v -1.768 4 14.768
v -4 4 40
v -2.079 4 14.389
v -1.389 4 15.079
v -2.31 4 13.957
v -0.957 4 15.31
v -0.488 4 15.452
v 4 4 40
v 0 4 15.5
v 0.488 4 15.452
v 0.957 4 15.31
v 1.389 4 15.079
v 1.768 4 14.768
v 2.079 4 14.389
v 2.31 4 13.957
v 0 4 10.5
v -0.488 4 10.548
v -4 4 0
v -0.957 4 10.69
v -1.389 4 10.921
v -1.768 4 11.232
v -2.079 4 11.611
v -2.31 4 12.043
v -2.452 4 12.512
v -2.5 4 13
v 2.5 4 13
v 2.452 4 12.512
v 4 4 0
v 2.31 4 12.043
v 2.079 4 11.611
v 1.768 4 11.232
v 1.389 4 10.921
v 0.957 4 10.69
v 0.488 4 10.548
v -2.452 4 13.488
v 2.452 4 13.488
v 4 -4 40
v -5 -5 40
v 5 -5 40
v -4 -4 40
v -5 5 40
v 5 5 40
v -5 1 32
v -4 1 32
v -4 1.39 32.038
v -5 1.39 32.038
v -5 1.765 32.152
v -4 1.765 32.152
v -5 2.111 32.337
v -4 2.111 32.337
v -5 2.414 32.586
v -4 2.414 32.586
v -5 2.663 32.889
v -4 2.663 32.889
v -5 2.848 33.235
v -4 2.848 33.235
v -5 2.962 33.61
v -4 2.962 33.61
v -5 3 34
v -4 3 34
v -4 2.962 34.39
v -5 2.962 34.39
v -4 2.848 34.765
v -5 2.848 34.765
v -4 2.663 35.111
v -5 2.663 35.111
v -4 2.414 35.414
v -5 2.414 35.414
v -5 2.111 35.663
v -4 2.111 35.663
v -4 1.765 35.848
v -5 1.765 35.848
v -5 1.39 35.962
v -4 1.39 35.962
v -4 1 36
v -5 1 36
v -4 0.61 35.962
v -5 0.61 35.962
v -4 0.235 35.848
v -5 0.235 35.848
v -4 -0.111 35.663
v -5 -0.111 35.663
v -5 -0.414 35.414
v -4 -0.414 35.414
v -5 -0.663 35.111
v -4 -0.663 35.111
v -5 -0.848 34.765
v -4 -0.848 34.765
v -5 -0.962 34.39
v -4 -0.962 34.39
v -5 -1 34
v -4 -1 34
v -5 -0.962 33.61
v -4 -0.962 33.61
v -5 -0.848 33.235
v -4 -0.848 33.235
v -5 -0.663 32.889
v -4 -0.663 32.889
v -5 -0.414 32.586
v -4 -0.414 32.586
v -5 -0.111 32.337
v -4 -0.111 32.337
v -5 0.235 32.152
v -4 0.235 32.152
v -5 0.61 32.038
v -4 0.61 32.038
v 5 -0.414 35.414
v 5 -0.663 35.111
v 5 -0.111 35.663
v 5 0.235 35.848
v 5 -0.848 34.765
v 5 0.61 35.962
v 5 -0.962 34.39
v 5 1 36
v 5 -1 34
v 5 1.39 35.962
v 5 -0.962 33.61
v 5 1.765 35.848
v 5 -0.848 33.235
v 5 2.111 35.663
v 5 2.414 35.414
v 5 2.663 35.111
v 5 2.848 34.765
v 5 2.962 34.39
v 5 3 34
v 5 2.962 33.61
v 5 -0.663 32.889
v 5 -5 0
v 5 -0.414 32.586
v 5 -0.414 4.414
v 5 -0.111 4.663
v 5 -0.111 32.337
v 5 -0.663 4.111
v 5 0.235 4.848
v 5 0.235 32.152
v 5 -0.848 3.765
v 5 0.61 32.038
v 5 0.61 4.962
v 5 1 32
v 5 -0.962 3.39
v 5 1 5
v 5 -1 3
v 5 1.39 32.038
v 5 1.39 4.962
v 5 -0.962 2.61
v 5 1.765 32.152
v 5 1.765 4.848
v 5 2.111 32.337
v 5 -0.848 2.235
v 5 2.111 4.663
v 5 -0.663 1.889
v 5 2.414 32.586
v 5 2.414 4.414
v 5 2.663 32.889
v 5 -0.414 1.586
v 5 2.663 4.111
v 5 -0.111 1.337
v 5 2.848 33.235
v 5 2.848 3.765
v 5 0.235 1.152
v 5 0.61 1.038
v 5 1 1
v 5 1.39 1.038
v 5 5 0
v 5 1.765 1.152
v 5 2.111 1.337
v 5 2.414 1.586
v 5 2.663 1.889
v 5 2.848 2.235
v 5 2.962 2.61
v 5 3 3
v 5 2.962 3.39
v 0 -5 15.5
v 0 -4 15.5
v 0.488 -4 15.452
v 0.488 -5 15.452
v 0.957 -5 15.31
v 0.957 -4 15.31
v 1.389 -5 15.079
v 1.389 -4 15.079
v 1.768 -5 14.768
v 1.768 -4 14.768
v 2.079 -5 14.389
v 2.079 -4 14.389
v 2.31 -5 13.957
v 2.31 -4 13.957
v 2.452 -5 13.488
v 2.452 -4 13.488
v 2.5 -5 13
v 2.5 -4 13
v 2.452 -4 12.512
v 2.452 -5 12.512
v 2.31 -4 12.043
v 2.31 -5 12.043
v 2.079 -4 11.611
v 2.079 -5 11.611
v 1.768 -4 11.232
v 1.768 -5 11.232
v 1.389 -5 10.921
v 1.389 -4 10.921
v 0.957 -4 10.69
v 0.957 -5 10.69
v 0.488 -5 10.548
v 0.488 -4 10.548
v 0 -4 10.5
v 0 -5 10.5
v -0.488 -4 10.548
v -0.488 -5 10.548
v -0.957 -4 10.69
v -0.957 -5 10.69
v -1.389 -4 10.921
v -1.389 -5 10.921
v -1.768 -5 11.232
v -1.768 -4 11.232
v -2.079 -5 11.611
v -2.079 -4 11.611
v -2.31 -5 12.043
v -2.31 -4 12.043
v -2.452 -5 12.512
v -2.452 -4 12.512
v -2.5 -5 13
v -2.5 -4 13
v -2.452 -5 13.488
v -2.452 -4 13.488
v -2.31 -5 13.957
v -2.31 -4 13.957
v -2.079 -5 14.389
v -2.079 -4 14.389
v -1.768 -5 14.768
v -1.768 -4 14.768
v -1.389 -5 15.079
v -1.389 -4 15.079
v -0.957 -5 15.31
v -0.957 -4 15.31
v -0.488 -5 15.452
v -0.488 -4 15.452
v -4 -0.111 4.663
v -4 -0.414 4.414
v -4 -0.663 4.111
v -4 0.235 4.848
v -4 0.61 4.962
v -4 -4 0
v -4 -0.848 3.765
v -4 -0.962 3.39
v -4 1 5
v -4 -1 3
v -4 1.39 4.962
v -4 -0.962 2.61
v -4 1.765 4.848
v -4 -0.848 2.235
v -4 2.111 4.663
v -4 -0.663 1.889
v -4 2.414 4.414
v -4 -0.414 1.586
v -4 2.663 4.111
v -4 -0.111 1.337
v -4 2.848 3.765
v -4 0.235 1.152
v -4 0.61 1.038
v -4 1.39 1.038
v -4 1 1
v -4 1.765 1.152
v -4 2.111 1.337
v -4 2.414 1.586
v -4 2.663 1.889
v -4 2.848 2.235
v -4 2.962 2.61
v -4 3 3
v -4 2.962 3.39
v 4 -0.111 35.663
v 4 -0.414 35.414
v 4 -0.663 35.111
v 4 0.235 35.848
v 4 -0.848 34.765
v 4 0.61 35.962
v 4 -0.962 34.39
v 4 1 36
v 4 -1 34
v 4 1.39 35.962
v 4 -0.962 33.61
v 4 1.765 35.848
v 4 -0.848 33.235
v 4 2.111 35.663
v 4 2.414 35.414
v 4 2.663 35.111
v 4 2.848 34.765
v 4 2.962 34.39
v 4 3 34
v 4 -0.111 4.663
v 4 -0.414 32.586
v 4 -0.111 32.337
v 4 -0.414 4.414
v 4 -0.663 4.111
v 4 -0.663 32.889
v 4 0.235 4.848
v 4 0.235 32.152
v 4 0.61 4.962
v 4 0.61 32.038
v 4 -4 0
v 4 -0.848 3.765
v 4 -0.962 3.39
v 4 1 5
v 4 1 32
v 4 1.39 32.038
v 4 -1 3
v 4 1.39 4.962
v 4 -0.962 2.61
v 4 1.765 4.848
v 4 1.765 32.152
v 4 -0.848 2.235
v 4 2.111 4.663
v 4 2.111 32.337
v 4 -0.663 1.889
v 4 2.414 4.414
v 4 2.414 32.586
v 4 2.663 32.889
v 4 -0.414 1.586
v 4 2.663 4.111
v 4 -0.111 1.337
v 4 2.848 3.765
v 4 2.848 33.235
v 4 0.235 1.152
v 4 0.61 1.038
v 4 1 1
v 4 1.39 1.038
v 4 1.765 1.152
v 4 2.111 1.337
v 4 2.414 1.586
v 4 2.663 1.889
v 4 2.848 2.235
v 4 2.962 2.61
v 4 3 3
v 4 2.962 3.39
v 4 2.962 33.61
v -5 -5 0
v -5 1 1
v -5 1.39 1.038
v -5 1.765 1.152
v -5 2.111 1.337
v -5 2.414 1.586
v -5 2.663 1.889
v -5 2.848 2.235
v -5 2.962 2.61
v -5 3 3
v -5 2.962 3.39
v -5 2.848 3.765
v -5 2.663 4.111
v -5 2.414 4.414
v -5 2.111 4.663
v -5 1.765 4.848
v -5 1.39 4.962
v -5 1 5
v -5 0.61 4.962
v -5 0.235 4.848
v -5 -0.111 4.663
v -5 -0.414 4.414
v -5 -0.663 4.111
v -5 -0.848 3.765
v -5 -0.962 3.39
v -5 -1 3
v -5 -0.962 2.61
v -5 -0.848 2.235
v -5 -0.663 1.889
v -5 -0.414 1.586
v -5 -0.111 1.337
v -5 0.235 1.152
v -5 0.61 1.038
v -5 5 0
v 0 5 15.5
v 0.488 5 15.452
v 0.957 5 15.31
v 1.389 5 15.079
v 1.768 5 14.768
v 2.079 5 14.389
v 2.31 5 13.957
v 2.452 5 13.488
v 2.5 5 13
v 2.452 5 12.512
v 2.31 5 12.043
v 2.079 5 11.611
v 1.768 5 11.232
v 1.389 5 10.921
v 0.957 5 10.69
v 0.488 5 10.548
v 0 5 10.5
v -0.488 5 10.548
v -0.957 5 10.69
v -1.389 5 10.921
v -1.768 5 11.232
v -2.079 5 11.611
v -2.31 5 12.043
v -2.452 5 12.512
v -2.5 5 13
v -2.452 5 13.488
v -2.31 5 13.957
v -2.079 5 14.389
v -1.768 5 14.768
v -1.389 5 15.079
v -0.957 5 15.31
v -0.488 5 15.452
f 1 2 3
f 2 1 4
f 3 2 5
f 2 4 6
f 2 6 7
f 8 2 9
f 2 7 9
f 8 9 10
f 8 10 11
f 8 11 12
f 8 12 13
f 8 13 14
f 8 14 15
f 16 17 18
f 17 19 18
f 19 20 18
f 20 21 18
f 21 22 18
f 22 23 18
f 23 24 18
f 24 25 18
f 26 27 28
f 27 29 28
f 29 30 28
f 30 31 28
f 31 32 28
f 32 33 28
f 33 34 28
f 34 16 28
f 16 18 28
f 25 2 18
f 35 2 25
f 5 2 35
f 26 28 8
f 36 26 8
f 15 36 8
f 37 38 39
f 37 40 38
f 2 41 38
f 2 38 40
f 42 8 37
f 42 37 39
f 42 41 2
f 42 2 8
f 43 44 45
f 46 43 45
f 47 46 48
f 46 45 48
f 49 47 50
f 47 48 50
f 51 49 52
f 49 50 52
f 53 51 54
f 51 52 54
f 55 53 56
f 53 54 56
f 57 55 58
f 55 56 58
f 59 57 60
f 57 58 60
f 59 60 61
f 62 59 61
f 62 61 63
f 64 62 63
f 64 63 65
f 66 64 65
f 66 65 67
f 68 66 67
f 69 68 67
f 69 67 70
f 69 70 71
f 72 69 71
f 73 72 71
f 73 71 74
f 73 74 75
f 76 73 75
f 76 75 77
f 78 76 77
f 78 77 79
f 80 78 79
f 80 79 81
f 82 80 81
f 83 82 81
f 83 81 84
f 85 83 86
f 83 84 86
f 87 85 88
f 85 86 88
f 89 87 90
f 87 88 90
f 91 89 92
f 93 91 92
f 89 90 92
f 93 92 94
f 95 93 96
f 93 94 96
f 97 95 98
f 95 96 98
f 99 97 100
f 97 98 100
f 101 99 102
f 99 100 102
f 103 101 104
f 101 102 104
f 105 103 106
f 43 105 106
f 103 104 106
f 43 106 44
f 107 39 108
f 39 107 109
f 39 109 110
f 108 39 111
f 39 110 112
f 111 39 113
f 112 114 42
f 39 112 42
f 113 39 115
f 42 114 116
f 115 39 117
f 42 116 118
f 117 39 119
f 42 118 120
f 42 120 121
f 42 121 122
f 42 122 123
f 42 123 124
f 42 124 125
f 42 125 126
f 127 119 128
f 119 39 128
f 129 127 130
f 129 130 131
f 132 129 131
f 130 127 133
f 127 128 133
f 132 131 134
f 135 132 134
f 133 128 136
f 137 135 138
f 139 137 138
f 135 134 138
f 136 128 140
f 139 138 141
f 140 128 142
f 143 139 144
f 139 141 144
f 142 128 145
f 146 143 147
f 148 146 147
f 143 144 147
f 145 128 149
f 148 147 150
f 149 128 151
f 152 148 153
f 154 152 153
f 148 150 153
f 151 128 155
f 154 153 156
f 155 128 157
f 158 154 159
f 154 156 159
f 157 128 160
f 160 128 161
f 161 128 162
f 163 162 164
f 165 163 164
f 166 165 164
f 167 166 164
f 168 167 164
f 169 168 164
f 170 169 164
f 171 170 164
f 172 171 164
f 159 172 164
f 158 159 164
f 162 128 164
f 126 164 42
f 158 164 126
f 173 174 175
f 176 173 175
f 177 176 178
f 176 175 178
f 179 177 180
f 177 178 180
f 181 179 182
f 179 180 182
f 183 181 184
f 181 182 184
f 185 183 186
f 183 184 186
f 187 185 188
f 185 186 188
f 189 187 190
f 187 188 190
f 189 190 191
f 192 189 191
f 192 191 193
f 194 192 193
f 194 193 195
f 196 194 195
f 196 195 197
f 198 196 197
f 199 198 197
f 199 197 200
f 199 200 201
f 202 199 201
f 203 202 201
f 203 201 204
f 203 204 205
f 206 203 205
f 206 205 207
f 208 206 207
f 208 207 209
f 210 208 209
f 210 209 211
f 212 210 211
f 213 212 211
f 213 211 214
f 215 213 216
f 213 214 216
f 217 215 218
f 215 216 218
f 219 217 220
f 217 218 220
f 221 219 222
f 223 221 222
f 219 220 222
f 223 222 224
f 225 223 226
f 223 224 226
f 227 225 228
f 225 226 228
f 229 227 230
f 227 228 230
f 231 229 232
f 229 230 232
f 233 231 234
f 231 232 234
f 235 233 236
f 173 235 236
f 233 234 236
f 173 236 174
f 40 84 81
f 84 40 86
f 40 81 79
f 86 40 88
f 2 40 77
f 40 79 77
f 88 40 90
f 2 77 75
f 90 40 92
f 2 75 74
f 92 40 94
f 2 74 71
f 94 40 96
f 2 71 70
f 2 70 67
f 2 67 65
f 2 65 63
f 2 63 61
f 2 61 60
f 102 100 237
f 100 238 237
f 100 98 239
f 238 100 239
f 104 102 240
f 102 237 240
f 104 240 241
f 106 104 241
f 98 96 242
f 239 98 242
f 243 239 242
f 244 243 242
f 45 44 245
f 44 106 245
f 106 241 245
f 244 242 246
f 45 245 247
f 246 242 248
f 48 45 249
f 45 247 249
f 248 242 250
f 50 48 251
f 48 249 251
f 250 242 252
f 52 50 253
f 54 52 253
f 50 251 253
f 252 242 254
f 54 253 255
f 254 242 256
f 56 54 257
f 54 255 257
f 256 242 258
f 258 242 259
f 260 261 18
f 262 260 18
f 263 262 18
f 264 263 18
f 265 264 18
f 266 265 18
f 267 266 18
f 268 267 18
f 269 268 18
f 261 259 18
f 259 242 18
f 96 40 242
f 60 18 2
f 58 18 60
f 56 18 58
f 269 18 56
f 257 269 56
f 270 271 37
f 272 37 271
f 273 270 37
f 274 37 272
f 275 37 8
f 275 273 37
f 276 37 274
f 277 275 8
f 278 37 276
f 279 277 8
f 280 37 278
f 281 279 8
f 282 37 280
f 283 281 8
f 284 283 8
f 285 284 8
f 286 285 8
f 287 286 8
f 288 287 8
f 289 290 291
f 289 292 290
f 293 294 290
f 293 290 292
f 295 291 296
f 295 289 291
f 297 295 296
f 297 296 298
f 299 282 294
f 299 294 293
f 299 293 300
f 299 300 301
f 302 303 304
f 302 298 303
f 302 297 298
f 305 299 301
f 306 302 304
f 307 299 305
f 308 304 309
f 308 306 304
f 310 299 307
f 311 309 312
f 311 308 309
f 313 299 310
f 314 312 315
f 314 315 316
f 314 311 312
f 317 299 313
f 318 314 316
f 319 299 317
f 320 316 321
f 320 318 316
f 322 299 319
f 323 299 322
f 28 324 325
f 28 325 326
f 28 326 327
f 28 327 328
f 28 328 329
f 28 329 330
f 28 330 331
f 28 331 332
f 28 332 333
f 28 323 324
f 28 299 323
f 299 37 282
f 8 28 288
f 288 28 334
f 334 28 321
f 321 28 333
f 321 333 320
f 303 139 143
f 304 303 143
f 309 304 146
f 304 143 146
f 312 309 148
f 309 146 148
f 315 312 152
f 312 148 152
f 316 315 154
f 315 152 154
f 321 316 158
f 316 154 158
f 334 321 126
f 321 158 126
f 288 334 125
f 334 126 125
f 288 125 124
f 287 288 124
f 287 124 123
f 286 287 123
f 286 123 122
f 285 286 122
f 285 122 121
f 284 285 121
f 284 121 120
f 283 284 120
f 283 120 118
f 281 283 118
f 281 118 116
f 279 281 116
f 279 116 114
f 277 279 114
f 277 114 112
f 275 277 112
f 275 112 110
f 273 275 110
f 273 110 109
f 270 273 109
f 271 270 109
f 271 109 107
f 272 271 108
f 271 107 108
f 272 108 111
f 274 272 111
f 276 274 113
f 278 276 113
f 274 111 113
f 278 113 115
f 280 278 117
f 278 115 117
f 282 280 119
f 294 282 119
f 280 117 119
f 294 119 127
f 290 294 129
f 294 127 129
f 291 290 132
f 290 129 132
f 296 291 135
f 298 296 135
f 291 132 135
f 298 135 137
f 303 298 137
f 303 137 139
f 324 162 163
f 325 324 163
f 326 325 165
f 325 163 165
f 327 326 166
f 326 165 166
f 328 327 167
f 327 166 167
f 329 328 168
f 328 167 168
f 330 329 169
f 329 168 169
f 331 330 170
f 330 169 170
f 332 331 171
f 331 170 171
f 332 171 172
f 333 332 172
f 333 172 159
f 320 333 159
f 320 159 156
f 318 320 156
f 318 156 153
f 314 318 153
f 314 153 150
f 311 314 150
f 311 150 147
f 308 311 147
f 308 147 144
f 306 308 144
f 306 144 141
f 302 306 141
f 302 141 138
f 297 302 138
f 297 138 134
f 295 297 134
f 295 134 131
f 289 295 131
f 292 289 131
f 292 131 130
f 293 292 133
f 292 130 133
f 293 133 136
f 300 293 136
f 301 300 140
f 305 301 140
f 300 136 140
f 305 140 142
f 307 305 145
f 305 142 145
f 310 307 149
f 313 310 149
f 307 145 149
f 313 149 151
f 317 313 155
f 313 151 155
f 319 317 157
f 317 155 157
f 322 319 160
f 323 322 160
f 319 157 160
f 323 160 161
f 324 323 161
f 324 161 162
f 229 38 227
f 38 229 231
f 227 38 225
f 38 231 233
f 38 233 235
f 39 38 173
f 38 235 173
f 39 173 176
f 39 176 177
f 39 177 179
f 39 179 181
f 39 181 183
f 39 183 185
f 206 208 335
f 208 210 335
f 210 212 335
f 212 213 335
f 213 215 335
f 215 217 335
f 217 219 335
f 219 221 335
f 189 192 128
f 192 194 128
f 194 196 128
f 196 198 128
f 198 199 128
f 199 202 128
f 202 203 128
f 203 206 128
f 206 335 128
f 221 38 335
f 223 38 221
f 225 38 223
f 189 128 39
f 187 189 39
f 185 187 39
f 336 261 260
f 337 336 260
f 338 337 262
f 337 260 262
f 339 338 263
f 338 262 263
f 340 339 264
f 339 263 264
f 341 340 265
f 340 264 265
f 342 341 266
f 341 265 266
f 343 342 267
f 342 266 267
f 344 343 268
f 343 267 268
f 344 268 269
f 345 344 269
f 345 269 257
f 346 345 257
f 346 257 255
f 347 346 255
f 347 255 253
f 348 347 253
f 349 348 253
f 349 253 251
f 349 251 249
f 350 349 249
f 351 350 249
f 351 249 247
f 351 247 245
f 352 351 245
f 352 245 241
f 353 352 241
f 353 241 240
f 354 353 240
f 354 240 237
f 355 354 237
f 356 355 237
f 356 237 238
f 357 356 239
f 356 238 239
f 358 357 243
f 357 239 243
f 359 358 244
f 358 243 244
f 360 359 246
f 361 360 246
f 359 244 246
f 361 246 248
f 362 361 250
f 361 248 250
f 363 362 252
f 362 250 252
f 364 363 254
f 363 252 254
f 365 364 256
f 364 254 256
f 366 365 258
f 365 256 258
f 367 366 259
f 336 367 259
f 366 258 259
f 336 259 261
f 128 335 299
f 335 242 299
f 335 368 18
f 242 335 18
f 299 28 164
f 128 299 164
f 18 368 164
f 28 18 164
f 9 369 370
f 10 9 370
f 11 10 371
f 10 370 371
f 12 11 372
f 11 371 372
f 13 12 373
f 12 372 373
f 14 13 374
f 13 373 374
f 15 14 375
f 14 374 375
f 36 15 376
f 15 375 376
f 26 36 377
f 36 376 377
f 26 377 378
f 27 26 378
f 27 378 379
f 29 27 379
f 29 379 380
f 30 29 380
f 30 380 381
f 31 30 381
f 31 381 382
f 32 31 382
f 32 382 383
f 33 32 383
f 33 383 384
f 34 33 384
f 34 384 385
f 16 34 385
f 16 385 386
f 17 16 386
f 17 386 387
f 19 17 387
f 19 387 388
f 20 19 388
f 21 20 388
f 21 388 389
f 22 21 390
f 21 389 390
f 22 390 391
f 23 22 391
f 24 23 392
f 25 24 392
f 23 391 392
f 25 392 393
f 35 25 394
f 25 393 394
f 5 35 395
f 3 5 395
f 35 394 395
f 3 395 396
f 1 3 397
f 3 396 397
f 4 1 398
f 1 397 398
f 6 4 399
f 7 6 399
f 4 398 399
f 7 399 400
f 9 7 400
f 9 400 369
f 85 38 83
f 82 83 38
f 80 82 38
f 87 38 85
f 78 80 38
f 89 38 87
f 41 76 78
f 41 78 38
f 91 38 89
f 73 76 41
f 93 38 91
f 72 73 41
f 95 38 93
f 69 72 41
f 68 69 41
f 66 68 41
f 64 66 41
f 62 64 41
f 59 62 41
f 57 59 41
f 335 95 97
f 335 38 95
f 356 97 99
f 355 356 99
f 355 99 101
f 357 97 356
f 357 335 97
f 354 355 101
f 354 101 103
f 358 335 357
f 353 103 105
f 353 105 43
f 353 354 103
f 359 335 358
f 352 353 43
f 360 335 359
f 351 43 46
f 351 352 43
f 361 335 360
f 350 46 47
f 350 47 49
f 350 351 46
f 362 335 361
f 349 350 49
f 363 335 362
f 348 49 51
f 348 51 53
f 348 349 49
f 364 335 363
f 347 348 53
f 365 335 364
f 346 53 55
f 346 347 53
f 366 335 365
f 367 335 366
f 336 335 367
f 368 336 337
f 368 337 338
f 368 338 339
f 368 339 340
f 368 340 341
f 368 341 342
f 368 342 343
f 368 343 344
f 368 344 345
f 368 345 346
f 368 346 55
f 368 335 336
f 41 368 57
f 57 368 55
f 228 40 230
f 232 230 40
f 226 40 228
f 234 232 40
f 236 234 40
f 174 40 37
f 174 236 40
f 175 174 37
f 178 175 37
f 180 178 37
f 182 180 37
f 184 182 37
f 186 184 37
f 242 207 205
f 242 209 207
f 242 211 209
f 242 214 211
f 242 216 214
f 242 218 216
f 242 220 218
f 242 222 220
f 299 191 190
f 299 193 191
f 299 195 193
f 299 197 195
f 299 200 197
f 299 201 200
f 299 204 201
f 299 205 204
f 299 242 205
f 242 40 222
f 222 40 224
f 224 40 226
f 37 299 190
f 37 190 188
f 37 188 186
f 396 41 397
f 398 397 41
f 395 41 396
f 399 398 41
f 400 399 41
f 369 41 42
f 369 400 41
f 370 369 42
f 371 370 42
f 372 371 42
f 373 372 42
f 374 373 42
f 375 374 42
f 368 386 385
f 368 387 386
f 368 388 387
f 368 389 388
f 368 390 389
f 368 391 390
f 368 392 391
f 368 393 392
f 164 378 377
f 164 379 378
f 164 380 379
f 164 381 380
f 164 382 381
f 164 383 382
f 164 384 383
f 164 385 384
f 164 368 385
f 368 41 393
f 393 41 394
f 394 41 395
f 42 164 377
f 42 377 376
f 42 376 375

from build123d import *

# Parameters (mm, degrees)
SKIZZE1_W                       = 10
SKIZZE1_H                       = 10
SKIZZE1_W_2                     = 8
SKIZZE1_H_2                     = 8
AUFSATZ_LINEAR_AUSTRAGEN1_DEPTH = 40
SKIZZE2_R                       = 2
SCHNITT_LINEAR_AUSTRAGEN1_DEPTH = 42.533119315
SKIZZE3_R                       = 2.5
SCHNITT_LINEAR_AUSTRAGEN2_DEPTH = 17


with BuildPart() as part:
    # Skizze1 → Aufsatz-Linear austragen1 (new body)
    with BuildSketch(Plane.XY):
        Rectangle(SKIZZE1_W, SKIZZE1_H)
        Rectangle(SKIZZE1_W_2, SKIZZE1_H_2, mode=Mode.SUBTRACT)
    extrude(amount=AUFSATZ_LINEAR_AUSTRAGEN1_DEPTH)

    # Skizze2 → Schnitt-Linear austragen1 (cut, through all)
    with BuildSketch(Plane(origin=(5, 0, 0), x_dir=(0, 0, -1), z_dir=(1, 0, 0))):
        with Locations((-34, 1)):
            Circle(SKIZZE2_R)
        with Locations((-3, 1)):
            Circle(SKIZZE2_R)
    extrude(amount=-SCHNITT_LINEAR_AUSTRAGEN1_DEPTH, mode=Mode.SUBTRACT)

    # Skizze3 → Schnitt-Linear austragen2 (cut)
    with BuildSketch(Plane(origin=(0, 5, 0), x_dir=(1, 0, 0), z_dir=(0, 1, 0))):
        with Locations(Location((0, -13, 0), (0, 0, 270))):
            Circle(SKIZZE3_R)
    extrude(amount=-SCHNITT_LINEAR_AUSTRAGEN2_DEPTH, mode=Mode.SUBTRACT)


solid = part.part
